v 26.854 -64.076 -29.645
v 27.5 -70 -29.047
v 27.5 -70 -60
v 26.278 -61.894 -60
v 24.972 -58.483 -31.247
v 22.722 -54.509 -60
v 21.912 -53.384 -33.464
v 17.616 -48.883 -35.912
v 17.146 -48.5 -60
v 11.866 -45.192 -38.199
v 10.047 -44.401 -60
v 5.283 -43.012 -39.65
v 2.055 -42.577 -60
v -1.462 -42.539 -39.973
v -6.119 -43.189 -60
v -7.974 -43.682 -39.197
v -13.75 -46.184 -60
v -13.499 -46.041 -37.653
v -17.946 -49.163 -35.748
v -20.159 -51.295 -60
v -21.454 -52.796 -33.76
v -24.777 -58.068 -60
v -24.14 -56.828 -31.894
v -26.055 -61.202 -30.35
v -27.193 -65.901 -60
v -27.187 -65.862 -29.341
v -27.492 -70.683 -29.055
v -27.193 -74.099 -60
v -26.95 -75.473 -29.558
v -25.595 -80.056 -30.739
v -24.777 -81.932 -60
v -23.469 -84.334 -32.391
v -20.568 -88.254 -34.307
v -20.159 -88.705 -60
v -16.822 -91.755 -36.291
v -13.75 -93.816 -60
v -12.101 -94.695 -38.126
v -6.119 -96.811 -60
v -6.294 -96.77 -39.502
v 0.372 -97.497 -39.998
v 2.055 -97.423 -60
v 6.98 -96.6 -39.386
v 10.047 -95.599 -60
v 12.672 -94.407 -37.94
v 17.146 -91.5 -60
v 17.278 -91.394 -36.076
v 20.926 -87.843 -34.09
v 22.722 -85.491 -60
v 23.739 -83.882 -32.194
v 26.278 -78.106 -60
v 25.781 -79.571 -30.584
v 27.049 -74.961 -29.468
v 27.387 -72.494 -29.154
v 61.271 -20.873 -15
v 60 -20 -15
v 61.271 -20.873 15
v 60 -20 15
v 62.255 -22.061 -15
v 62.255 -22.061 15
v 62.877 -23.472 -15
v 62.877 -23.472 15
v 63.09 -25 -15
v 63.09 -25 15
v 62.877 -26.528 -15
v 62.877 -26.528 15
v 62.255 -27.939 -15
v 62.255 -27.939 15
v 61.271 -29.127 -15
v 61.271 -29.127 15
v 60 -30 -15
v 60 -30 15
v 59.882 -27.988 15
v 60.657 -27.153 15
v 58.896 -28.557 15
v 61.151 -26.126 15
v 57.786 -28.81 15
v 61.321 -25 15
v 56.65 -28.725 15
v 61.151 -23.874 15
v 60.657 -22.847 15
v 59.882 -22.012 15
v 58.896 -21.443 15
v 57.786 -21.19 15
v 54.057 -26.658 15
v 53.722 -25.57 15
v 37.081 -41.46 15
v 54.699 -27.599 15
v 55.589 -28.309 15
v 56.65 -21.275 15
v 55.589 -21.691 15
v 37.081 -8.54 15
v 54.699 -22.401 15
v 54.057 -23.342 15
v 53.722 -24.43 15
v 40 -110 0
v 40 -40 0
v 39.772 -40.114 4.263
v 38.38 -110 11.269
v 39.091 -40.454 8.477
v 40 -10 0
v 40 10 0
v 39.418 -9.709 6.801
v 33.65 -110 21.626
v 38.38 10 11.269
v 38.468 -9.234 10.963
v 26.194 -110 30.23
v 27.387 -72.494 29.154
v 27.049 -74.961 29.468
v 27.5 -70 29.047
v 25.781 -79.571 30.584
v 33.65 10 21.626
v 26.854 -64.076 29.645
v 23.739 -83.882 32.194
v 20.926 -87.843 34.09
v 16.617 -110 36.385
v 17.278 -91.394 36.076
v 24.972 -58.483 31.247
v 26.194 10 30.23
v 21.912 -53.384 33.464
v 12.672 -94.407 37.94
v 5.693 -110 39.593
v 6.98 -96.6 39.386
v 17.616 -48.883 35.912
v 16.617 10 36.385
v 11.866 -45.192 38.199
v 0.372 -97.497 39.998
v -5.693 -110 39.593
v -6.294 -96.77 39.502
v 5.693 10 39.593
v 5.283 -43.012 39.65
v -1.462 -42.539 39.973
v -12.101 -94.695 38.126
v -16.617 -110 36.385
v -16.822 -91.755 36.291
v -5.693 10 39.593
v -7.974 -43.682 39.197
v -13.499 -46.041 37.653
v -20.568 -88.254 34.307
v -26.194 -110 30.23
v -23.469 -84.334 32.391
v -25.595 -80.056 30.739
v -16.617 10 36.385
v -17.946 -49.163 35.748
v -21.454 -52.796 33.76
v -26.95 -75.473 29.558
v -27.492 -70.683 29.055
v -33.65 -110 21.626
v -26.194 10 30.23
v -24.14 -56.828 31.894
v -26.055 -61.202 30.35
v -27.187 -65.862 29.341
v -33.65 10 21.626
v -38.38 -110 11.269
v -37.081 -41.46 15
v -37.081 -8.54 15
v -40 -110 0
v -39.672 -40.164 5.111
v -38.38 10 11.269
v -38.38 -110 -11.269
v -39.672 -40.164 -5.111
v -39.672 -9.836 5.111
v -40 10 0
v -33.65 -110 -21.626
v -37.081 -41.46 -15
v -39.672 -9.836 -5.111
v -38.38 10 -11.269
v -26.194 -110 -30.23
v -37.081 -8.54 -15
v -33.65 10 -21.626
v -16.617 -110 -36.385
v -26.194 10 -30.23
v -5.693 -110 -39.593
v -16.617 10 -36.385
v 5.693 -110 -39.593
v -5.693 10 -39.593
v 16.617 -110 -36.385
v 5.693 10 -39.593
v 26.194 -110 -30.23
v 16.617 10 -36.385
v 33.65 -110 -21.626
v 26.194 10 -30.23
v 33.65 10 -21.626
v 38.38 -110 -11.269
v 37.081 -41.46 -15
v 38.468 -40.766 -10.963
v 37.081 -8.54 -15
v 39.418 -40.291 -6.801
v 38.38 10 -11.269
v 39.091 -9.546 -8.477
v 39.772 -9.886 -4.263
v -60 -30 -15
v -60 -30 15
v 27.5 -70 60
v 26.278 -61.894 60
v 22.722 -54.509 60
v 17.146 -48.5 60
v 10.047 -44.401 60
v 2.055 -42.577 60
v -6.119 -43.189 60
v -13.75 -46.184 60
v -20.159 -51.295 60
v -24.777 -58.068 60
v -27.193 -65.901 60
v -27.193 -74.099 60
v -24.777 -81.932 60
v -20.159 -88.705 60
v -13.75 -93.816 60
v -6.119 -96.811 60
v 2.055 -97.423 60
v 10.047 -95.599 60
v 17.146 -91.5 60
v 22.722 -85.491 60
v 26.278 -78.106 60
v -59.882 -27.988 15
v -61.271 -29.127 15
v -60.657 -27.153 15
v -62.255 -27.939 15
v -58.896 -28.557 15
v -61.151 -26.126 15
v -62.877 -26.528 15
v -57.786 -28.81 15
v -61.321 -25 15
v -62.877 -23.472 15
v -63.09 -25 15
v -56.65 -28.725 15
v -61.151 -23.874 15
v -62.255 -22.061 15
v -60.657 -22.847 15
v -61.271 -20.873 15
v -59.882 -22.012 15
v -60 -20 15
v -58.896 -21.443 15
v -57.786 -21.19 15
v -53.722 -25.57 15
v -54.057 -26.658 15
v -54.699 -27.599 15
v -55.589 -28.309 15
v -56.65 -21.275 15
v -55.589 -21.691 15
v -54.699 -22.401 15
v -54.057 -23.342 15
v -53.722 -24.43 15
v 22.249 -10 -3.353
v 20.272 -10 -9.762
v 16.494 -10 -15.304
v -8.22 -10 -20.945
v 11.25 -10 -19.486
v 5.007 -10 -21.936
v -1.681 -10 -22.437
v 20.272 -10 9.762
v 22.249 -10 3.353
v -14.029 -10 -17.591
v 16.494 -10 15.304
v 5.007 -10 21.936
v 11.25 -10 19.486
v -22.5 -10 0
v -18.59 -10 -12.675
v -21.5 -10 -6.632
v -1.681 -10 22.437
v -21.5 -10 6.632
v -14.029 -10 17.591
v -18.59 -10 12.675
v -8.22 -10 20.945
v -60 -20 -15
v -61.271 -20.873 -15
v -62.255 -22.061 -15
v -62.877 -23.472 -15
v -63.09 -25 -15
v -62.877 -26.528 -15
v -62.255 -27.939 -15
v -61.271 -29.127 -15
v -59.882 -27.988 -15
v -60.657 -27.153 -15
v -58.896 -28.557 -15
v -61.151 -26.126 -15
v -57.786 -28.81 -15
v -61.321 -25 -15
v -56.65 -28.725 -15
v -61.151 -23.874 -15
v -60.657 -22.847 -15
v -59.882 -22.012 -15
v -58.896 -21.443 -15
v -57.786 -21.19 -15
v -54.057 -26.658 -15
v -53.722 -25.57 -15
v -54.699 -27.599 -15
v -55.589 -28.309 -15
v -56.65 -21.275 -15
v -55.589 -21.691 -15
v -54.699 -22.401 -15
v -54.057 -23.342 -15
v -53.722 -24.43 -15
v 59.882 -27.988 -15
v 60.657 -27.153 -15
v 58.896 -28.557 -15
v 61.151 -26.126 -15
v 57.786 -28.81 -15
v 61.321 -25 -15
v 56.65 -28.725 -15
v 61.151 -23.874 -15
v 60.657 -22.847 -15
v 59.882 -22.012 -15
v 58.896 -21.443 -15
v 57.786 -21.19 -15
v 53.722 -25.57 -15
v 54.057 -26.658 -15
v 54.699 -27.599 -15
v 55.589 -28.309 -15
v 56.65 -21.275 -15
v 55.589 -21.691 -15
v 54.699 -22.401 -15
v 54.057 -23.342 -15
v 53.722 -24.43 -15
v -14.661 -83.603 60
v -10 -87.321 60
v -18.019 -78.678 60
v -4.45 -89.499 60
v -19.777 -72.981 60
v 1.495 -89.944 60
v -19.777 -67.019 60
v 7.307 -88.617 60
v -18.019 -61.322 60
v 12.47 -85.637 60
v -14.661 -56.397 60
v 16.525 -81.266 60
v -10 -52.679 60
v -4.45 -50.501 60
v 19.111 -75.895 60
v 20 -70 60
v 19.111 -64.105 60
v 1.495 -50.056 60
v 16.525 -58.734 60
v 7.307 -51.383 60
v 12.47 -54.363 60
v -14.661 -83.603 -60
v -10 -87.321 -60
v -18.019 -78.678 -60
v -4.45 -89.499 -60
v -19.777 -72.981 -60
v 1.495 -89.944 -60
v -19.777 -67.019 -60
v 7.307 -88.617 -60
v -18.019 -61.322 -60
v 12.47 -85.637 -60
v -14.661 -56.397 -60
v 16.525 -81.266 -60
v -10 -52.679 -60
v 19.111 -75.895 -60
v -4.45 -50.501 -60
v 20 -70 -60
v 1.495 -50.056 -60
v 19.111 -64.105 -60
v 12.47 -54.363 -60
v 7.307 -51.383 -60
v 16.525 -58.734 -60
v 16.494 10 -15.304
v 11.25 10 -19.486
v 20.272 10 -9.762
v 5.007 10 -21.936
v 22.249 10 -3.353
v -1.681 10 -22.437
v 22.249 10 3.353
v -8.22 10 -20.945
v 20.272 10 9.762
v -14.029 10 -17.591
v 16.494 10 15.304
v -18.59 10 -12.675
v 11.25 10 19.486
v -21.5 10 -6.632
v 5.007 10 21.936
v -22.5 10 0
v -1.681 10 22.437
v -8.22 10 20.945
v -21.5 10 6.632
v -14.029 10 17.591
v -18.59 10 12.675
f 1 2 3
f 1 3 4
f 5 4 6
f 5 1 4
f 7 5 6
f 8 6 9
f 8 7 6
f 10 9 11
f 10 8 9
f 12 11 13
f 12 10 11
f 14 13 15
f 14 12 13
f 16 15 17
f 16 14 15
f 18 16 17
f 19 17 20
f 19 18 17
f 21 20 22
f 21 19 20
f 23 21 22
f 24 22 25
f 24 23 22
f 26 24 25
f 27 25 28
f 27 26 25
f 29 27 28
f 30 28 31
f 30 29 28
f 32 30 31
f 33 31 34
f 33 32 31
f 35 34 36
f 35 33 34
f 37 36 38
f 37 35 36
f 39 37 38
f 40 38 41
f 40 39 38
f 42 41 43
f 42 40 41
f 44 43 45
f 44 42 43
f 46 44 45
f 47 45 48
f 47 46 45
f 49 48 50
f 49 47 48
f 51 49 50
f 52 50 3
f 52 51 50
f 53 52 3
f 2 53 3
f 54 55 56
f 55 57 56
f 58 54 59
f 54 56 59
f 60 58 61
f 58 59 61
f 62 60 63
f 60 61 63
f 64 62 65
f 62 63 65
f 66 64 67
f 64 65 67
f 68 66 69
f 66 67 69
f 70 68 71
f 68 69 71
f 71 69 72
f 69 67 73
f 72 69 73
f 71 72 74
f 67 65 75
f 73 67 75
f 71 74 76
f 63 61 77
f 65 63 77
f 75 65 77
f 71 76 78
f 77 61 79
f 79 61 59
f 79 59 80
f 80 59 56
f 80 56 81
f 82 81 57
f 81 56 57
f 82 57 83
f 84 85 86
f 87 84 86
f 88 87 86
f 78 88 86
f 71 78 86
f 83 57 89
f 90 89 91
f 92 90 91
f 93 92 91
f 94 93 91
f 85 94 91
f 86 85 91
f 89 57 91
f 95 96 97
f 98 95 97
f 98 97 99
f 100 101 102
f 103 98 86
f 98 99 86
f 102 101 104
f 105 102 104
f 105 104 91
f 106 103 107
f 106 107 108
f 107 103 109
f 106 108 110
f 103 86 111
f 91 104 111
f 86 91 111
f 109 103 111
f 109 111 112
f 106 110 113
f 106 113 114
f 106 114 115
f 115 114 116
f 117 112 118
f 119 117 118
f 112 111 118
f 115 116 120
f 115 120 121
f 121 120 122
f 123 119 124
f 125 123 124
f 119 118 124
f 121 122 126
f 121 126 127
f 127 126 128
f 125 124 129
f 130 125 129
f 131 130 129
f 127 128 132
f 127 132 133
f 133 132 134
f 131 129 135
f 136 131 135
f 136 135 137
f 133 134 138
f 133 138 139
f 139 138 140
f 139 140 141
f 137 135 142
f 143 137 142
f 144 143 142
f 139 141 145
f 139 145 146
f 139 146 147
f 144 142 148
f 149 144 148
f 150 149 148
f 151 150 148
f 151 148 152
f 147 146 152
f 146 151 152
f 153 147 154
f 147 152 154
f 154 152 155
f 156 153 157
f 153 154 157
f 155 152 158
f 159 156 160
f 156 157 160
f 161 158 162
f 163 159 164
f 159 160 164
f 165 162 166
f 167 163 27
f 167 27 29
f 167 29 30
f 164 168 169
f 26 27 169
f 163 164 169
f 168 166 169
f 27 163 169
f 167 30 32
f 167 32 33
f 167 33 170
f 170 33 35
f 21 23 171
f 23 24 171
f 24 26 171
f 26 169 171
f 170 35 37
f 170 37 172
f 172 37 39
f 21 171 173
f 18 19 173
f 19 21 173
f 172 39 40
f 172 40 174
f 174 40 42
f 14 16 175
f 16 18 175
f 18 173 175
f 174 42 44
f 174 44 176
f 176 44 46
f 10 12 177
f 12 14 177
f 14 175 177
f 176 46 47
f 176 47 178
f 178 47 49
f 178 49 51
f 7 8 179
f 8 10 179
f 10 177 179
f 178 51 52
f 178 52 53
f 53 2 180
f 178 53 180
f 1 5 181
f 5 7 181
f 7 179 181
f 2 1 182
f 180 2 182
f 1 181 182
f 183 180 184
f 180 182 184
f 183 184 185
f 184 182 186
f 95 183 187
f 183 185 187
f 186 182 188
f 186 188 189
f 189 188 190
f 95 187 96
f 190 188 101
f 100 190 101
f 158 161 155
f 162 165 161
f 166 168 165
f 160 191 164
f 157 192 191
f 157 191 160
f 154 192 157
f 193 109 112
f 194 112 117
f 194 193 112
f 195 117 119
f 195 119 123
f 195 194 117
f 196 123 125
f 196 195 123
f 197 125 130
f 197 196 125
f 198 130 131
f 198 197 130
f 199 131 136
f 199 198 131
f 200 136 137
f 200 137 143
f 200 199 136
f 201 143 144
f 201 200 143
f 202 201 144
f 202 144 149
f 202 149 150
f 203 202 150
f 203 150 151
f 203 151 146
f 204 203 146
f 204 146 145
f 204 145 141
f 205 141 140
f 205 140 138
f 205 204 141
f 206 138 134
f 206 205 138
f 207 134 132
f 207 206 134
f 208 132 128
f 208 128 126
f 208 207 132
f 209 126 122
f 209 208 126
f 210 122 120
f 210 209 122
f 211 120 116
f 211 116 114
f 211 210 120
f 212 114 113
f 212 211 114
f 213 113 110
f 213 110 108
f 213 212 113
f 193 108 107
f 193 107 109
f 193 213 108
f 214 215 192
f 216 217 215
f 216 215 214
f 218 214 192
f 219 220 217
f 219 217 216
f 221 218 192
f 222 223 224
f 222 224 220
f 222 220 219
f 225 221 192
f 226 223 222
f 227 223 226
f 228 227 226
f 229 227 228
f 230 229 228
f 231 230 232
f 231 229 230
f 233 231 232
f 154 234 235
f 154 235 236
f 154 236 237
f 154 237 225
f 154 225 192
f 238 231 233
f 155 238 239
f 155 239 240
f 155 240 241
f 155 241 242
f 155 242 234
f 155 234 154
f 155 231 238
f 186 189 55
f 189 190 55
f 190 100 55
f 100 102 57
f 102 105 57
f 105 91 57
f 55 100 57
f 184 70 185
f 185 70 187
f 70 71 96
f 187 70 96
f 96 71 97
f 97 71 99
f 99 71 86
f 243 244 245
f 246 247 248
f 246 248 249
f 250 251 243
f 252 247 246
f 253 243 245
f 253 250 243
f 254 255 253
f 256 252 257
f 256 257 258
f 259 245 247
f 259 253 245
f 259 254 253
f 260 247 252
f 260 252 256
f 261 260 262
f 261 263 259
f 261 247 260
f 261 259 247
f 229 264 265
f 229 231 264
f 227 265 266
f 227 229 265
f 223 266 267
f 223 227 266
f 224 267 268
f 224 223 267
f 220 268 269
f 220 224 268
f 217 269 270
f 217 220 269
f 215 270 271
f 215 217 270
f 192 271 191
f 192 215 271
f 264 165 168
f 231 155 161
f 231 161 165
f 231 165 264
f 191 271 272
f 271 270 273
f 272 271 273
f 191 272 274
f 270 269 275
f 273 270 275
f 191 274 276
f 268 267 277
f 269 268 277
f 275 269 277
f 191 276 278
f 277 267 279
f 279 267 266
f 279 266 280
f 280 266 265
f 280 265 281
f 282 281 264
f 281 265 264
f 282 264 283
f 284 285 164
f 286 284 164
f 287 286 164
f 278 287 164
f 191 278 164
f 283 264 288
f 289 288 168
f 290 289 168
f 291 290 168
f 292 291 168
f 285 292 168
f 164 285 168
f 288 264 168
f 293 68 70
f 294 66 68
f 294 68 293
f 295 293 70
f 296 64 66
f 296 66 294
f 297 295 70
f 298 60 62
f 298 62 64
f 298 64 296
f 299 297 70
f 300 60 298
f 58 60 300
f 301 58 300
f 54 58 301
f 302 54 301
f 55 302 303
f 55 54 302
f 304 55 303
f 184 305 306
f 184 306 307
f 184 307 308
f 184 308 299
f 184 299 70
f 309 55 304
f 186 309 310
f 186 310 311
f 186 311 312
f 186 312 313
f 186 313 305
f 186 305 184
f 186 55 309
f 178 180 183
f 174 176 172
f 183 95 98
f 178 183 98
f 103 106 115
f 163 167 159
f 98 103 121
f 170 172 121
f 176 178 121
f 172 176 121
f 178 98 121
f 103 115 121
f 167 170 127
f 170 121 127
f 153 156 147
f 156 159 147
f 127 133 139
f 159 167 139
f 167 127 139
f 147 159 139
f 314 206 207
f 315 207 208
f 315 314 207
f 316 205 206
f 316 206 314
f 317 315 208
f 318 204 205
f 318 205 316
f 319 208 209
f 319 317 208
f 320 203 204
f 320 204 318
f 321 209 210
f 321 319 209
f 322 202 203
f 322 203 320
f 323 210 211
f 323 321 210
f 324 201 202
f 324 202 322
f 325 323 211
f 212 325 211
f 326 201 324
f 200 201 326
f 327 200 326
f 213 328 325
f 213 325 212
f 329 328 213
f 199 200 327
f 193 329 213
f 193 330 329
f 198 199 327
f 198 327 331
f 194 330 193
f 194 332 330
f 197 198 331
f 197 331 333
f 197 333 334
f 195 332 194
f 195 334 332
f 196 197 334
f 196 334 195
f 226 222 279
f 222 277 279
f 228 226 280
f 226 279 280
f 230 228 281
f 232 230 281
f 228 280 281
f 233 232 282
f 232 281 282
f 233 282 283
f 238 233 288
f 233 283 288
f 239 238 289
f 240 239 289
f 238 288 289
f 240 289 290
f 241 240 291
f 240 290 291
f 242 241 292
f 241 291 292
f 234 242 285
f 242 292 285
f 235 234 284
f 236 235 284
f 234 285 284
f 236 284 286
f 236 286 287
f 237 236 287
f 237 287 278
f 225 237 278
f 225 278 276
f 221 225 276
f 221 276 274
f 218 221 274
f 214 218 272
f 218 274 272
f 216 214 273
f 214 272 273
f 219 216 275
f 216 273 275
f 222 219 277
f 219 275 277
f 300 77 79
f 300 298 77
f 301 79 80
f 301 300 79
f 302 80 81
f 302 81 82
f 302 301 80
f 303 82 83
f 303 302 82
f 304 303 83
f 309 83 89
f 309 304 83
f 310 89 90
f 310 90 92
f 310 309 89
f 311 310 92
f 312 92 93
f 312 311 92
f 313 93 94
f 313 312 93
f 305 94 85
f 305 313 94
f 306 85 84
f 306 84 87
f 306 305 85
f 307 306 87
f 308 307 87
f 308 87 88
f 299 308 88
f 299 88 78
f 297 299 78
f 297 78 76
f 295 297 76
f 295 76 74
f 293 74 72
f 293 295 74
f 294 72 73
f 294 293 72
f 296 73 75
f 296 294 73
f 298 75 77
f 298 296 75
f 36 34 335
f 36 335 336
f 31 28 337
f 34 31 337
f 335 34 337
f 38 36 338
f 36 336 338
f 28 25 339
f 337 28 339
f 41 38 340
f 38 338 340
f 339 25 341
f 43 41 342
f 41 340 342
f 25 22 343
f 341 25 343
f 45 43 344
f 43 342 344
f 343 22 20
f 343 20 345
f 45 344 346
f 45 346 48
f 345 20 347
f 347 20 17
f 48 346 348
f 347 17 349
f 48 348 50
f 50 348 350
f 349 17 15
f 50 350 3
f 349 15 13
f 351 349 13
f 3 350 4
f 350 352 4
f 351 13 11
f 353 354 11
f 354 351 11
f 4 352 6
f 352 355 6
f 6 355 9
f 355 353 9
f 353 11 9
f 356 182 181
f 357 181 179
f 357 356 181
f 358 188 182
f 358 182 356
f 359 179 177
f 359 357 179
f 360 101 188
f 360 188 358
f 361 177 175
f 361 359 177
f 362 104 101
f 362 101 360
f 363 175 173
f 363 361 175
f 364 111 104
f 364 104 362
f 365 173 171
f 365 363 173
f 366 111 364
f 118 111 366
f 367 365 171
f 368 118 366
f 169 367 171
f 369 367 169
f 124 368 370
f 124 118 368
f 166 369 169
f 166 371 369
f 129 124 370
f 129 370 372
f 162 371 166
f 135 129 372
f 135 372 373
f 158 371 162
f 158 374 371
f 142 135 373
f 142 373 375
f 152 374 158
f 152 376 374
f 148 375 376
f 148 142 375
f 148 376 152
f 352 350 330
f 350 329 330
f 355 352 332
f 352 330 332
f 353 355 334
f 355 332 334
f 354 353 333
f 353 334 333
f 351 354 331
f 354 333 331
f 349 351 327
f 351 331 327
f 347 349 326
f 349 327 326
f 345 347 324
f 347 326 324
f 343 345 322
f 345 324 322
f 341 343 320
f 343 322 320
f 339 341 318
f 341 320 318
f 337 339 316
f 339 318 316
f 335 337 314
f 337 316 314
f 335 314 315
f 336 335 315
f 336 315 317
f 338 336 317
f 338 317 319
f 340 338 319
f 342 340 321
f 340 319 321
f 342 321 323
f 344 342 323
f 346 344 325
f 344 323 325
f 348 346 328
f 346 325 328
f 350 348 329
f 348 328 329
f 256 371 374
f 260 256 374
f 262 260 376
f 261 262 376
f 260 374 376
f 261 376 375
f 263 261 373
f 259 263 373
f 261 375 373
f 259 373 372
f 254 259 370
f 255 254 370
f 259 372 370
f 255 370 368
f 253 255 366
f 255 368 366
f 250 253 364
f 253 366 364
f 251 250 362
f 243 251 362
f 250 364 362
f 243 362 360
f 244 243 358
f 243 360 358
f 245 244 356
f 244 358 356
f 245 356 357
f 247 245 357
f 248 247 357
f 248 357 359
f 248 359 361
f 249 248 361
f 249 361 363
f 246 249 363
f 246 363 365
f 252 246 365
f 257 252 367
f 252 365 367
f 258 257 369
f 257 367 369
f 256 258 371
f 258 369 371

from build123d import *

# Parameters (mm, degrees)
SKETCH1_W               = 40
SKETCH1_H               = 120
SKETCH3_R               = 3.821172455
BOSS_EXTRUDE1_DEPTH     = 15
SKETCH5_R               = 27.5
BOSS_EXTRUDE2_DEPTH     = 60
SKETCH4_R               = 22.5
CUT_EXTRUDE2_DEPTH      = 20
SKETCH2_R               = 20
CUT_EXTRUDE3_DEPTH      = 61.0000001
CUT_EXTRUDE3_DEPTH_BACK = 61.0000001


with BuildPart() as part:
    # Sketch1 → Base-Revolve (revolve)
    with BuildSketch(Plane.XY):
        with Locations((20, -50)):
            Rectangle(SKETCH1_W, SKETCH1_H)
    revolve(axis=Axis((0, 300, 0), (0, -1, 0)))

    # Sketch3 → Boss-Extrude1 (add, symmetric)
    with BuildSketch(Plane.XY):
        with BuildLine():
            Line((30, -5), (60, -20))
            ThreePointArc((60, -20), (63.090169944, -25), (60, -30))
            Line((60, -30), (30, -45))
            Line((30, -45), (30, -5))
        make_face()
        with Locations((57.5, -25)):
            Circle(SKETCH3_R, mode=Mode.SUBTRACT)
    boss_extrude1 = extrude(amount=BOSS_EXTRUDE1_DEPTH, both=True)

    # Mirror1: Boss-Extrude1 across plane
    add(boss_extrude1.mirror(Plane(origin=(0, 0, 0), x_dir=(0, 0, 1), z_dir=(1, 0, 0))))

    # Sketch5 → Boss-Extrude2 (add, symmetric)
    with BuildSketch(Plane.XY):
        with Locations((0, -70)):
            Circle(SKETCH5_R)
    extrude(amount=BOSS_EXTRUDE2_DEPTH, both=True)

    # Sketch4 → Cut-Extrude2 (cut)
    with BuildSketch(Plane(origin=(0, 10, 0), x_dir=(-1, 0, 0), z_dir=(0, 1, 0))):
        Circle(SKETCH4_R)
    extrude(amount=-CUT_EXTRUDE2_DEPTH, mode=Mode.SUBTRACT)

    # Sketch2 → Cut-Extrude3 (cut, two sides)
    with BuildSketch(Plane.XY) as cut_extrude3_sk:
        with Locations((0, -70)):
            Circle(SKETCH2_R)
    extrude(amount=CUT_EXTRUDE3_DEPTH, mode=Mode.SUBTRACT)
    extrude(cut_extrude3_sk.sketch, amount=-CUT_EXTRUDE3_DEPTH_BACK, mode=Mode.SUBTRACT)


solid = part.part
